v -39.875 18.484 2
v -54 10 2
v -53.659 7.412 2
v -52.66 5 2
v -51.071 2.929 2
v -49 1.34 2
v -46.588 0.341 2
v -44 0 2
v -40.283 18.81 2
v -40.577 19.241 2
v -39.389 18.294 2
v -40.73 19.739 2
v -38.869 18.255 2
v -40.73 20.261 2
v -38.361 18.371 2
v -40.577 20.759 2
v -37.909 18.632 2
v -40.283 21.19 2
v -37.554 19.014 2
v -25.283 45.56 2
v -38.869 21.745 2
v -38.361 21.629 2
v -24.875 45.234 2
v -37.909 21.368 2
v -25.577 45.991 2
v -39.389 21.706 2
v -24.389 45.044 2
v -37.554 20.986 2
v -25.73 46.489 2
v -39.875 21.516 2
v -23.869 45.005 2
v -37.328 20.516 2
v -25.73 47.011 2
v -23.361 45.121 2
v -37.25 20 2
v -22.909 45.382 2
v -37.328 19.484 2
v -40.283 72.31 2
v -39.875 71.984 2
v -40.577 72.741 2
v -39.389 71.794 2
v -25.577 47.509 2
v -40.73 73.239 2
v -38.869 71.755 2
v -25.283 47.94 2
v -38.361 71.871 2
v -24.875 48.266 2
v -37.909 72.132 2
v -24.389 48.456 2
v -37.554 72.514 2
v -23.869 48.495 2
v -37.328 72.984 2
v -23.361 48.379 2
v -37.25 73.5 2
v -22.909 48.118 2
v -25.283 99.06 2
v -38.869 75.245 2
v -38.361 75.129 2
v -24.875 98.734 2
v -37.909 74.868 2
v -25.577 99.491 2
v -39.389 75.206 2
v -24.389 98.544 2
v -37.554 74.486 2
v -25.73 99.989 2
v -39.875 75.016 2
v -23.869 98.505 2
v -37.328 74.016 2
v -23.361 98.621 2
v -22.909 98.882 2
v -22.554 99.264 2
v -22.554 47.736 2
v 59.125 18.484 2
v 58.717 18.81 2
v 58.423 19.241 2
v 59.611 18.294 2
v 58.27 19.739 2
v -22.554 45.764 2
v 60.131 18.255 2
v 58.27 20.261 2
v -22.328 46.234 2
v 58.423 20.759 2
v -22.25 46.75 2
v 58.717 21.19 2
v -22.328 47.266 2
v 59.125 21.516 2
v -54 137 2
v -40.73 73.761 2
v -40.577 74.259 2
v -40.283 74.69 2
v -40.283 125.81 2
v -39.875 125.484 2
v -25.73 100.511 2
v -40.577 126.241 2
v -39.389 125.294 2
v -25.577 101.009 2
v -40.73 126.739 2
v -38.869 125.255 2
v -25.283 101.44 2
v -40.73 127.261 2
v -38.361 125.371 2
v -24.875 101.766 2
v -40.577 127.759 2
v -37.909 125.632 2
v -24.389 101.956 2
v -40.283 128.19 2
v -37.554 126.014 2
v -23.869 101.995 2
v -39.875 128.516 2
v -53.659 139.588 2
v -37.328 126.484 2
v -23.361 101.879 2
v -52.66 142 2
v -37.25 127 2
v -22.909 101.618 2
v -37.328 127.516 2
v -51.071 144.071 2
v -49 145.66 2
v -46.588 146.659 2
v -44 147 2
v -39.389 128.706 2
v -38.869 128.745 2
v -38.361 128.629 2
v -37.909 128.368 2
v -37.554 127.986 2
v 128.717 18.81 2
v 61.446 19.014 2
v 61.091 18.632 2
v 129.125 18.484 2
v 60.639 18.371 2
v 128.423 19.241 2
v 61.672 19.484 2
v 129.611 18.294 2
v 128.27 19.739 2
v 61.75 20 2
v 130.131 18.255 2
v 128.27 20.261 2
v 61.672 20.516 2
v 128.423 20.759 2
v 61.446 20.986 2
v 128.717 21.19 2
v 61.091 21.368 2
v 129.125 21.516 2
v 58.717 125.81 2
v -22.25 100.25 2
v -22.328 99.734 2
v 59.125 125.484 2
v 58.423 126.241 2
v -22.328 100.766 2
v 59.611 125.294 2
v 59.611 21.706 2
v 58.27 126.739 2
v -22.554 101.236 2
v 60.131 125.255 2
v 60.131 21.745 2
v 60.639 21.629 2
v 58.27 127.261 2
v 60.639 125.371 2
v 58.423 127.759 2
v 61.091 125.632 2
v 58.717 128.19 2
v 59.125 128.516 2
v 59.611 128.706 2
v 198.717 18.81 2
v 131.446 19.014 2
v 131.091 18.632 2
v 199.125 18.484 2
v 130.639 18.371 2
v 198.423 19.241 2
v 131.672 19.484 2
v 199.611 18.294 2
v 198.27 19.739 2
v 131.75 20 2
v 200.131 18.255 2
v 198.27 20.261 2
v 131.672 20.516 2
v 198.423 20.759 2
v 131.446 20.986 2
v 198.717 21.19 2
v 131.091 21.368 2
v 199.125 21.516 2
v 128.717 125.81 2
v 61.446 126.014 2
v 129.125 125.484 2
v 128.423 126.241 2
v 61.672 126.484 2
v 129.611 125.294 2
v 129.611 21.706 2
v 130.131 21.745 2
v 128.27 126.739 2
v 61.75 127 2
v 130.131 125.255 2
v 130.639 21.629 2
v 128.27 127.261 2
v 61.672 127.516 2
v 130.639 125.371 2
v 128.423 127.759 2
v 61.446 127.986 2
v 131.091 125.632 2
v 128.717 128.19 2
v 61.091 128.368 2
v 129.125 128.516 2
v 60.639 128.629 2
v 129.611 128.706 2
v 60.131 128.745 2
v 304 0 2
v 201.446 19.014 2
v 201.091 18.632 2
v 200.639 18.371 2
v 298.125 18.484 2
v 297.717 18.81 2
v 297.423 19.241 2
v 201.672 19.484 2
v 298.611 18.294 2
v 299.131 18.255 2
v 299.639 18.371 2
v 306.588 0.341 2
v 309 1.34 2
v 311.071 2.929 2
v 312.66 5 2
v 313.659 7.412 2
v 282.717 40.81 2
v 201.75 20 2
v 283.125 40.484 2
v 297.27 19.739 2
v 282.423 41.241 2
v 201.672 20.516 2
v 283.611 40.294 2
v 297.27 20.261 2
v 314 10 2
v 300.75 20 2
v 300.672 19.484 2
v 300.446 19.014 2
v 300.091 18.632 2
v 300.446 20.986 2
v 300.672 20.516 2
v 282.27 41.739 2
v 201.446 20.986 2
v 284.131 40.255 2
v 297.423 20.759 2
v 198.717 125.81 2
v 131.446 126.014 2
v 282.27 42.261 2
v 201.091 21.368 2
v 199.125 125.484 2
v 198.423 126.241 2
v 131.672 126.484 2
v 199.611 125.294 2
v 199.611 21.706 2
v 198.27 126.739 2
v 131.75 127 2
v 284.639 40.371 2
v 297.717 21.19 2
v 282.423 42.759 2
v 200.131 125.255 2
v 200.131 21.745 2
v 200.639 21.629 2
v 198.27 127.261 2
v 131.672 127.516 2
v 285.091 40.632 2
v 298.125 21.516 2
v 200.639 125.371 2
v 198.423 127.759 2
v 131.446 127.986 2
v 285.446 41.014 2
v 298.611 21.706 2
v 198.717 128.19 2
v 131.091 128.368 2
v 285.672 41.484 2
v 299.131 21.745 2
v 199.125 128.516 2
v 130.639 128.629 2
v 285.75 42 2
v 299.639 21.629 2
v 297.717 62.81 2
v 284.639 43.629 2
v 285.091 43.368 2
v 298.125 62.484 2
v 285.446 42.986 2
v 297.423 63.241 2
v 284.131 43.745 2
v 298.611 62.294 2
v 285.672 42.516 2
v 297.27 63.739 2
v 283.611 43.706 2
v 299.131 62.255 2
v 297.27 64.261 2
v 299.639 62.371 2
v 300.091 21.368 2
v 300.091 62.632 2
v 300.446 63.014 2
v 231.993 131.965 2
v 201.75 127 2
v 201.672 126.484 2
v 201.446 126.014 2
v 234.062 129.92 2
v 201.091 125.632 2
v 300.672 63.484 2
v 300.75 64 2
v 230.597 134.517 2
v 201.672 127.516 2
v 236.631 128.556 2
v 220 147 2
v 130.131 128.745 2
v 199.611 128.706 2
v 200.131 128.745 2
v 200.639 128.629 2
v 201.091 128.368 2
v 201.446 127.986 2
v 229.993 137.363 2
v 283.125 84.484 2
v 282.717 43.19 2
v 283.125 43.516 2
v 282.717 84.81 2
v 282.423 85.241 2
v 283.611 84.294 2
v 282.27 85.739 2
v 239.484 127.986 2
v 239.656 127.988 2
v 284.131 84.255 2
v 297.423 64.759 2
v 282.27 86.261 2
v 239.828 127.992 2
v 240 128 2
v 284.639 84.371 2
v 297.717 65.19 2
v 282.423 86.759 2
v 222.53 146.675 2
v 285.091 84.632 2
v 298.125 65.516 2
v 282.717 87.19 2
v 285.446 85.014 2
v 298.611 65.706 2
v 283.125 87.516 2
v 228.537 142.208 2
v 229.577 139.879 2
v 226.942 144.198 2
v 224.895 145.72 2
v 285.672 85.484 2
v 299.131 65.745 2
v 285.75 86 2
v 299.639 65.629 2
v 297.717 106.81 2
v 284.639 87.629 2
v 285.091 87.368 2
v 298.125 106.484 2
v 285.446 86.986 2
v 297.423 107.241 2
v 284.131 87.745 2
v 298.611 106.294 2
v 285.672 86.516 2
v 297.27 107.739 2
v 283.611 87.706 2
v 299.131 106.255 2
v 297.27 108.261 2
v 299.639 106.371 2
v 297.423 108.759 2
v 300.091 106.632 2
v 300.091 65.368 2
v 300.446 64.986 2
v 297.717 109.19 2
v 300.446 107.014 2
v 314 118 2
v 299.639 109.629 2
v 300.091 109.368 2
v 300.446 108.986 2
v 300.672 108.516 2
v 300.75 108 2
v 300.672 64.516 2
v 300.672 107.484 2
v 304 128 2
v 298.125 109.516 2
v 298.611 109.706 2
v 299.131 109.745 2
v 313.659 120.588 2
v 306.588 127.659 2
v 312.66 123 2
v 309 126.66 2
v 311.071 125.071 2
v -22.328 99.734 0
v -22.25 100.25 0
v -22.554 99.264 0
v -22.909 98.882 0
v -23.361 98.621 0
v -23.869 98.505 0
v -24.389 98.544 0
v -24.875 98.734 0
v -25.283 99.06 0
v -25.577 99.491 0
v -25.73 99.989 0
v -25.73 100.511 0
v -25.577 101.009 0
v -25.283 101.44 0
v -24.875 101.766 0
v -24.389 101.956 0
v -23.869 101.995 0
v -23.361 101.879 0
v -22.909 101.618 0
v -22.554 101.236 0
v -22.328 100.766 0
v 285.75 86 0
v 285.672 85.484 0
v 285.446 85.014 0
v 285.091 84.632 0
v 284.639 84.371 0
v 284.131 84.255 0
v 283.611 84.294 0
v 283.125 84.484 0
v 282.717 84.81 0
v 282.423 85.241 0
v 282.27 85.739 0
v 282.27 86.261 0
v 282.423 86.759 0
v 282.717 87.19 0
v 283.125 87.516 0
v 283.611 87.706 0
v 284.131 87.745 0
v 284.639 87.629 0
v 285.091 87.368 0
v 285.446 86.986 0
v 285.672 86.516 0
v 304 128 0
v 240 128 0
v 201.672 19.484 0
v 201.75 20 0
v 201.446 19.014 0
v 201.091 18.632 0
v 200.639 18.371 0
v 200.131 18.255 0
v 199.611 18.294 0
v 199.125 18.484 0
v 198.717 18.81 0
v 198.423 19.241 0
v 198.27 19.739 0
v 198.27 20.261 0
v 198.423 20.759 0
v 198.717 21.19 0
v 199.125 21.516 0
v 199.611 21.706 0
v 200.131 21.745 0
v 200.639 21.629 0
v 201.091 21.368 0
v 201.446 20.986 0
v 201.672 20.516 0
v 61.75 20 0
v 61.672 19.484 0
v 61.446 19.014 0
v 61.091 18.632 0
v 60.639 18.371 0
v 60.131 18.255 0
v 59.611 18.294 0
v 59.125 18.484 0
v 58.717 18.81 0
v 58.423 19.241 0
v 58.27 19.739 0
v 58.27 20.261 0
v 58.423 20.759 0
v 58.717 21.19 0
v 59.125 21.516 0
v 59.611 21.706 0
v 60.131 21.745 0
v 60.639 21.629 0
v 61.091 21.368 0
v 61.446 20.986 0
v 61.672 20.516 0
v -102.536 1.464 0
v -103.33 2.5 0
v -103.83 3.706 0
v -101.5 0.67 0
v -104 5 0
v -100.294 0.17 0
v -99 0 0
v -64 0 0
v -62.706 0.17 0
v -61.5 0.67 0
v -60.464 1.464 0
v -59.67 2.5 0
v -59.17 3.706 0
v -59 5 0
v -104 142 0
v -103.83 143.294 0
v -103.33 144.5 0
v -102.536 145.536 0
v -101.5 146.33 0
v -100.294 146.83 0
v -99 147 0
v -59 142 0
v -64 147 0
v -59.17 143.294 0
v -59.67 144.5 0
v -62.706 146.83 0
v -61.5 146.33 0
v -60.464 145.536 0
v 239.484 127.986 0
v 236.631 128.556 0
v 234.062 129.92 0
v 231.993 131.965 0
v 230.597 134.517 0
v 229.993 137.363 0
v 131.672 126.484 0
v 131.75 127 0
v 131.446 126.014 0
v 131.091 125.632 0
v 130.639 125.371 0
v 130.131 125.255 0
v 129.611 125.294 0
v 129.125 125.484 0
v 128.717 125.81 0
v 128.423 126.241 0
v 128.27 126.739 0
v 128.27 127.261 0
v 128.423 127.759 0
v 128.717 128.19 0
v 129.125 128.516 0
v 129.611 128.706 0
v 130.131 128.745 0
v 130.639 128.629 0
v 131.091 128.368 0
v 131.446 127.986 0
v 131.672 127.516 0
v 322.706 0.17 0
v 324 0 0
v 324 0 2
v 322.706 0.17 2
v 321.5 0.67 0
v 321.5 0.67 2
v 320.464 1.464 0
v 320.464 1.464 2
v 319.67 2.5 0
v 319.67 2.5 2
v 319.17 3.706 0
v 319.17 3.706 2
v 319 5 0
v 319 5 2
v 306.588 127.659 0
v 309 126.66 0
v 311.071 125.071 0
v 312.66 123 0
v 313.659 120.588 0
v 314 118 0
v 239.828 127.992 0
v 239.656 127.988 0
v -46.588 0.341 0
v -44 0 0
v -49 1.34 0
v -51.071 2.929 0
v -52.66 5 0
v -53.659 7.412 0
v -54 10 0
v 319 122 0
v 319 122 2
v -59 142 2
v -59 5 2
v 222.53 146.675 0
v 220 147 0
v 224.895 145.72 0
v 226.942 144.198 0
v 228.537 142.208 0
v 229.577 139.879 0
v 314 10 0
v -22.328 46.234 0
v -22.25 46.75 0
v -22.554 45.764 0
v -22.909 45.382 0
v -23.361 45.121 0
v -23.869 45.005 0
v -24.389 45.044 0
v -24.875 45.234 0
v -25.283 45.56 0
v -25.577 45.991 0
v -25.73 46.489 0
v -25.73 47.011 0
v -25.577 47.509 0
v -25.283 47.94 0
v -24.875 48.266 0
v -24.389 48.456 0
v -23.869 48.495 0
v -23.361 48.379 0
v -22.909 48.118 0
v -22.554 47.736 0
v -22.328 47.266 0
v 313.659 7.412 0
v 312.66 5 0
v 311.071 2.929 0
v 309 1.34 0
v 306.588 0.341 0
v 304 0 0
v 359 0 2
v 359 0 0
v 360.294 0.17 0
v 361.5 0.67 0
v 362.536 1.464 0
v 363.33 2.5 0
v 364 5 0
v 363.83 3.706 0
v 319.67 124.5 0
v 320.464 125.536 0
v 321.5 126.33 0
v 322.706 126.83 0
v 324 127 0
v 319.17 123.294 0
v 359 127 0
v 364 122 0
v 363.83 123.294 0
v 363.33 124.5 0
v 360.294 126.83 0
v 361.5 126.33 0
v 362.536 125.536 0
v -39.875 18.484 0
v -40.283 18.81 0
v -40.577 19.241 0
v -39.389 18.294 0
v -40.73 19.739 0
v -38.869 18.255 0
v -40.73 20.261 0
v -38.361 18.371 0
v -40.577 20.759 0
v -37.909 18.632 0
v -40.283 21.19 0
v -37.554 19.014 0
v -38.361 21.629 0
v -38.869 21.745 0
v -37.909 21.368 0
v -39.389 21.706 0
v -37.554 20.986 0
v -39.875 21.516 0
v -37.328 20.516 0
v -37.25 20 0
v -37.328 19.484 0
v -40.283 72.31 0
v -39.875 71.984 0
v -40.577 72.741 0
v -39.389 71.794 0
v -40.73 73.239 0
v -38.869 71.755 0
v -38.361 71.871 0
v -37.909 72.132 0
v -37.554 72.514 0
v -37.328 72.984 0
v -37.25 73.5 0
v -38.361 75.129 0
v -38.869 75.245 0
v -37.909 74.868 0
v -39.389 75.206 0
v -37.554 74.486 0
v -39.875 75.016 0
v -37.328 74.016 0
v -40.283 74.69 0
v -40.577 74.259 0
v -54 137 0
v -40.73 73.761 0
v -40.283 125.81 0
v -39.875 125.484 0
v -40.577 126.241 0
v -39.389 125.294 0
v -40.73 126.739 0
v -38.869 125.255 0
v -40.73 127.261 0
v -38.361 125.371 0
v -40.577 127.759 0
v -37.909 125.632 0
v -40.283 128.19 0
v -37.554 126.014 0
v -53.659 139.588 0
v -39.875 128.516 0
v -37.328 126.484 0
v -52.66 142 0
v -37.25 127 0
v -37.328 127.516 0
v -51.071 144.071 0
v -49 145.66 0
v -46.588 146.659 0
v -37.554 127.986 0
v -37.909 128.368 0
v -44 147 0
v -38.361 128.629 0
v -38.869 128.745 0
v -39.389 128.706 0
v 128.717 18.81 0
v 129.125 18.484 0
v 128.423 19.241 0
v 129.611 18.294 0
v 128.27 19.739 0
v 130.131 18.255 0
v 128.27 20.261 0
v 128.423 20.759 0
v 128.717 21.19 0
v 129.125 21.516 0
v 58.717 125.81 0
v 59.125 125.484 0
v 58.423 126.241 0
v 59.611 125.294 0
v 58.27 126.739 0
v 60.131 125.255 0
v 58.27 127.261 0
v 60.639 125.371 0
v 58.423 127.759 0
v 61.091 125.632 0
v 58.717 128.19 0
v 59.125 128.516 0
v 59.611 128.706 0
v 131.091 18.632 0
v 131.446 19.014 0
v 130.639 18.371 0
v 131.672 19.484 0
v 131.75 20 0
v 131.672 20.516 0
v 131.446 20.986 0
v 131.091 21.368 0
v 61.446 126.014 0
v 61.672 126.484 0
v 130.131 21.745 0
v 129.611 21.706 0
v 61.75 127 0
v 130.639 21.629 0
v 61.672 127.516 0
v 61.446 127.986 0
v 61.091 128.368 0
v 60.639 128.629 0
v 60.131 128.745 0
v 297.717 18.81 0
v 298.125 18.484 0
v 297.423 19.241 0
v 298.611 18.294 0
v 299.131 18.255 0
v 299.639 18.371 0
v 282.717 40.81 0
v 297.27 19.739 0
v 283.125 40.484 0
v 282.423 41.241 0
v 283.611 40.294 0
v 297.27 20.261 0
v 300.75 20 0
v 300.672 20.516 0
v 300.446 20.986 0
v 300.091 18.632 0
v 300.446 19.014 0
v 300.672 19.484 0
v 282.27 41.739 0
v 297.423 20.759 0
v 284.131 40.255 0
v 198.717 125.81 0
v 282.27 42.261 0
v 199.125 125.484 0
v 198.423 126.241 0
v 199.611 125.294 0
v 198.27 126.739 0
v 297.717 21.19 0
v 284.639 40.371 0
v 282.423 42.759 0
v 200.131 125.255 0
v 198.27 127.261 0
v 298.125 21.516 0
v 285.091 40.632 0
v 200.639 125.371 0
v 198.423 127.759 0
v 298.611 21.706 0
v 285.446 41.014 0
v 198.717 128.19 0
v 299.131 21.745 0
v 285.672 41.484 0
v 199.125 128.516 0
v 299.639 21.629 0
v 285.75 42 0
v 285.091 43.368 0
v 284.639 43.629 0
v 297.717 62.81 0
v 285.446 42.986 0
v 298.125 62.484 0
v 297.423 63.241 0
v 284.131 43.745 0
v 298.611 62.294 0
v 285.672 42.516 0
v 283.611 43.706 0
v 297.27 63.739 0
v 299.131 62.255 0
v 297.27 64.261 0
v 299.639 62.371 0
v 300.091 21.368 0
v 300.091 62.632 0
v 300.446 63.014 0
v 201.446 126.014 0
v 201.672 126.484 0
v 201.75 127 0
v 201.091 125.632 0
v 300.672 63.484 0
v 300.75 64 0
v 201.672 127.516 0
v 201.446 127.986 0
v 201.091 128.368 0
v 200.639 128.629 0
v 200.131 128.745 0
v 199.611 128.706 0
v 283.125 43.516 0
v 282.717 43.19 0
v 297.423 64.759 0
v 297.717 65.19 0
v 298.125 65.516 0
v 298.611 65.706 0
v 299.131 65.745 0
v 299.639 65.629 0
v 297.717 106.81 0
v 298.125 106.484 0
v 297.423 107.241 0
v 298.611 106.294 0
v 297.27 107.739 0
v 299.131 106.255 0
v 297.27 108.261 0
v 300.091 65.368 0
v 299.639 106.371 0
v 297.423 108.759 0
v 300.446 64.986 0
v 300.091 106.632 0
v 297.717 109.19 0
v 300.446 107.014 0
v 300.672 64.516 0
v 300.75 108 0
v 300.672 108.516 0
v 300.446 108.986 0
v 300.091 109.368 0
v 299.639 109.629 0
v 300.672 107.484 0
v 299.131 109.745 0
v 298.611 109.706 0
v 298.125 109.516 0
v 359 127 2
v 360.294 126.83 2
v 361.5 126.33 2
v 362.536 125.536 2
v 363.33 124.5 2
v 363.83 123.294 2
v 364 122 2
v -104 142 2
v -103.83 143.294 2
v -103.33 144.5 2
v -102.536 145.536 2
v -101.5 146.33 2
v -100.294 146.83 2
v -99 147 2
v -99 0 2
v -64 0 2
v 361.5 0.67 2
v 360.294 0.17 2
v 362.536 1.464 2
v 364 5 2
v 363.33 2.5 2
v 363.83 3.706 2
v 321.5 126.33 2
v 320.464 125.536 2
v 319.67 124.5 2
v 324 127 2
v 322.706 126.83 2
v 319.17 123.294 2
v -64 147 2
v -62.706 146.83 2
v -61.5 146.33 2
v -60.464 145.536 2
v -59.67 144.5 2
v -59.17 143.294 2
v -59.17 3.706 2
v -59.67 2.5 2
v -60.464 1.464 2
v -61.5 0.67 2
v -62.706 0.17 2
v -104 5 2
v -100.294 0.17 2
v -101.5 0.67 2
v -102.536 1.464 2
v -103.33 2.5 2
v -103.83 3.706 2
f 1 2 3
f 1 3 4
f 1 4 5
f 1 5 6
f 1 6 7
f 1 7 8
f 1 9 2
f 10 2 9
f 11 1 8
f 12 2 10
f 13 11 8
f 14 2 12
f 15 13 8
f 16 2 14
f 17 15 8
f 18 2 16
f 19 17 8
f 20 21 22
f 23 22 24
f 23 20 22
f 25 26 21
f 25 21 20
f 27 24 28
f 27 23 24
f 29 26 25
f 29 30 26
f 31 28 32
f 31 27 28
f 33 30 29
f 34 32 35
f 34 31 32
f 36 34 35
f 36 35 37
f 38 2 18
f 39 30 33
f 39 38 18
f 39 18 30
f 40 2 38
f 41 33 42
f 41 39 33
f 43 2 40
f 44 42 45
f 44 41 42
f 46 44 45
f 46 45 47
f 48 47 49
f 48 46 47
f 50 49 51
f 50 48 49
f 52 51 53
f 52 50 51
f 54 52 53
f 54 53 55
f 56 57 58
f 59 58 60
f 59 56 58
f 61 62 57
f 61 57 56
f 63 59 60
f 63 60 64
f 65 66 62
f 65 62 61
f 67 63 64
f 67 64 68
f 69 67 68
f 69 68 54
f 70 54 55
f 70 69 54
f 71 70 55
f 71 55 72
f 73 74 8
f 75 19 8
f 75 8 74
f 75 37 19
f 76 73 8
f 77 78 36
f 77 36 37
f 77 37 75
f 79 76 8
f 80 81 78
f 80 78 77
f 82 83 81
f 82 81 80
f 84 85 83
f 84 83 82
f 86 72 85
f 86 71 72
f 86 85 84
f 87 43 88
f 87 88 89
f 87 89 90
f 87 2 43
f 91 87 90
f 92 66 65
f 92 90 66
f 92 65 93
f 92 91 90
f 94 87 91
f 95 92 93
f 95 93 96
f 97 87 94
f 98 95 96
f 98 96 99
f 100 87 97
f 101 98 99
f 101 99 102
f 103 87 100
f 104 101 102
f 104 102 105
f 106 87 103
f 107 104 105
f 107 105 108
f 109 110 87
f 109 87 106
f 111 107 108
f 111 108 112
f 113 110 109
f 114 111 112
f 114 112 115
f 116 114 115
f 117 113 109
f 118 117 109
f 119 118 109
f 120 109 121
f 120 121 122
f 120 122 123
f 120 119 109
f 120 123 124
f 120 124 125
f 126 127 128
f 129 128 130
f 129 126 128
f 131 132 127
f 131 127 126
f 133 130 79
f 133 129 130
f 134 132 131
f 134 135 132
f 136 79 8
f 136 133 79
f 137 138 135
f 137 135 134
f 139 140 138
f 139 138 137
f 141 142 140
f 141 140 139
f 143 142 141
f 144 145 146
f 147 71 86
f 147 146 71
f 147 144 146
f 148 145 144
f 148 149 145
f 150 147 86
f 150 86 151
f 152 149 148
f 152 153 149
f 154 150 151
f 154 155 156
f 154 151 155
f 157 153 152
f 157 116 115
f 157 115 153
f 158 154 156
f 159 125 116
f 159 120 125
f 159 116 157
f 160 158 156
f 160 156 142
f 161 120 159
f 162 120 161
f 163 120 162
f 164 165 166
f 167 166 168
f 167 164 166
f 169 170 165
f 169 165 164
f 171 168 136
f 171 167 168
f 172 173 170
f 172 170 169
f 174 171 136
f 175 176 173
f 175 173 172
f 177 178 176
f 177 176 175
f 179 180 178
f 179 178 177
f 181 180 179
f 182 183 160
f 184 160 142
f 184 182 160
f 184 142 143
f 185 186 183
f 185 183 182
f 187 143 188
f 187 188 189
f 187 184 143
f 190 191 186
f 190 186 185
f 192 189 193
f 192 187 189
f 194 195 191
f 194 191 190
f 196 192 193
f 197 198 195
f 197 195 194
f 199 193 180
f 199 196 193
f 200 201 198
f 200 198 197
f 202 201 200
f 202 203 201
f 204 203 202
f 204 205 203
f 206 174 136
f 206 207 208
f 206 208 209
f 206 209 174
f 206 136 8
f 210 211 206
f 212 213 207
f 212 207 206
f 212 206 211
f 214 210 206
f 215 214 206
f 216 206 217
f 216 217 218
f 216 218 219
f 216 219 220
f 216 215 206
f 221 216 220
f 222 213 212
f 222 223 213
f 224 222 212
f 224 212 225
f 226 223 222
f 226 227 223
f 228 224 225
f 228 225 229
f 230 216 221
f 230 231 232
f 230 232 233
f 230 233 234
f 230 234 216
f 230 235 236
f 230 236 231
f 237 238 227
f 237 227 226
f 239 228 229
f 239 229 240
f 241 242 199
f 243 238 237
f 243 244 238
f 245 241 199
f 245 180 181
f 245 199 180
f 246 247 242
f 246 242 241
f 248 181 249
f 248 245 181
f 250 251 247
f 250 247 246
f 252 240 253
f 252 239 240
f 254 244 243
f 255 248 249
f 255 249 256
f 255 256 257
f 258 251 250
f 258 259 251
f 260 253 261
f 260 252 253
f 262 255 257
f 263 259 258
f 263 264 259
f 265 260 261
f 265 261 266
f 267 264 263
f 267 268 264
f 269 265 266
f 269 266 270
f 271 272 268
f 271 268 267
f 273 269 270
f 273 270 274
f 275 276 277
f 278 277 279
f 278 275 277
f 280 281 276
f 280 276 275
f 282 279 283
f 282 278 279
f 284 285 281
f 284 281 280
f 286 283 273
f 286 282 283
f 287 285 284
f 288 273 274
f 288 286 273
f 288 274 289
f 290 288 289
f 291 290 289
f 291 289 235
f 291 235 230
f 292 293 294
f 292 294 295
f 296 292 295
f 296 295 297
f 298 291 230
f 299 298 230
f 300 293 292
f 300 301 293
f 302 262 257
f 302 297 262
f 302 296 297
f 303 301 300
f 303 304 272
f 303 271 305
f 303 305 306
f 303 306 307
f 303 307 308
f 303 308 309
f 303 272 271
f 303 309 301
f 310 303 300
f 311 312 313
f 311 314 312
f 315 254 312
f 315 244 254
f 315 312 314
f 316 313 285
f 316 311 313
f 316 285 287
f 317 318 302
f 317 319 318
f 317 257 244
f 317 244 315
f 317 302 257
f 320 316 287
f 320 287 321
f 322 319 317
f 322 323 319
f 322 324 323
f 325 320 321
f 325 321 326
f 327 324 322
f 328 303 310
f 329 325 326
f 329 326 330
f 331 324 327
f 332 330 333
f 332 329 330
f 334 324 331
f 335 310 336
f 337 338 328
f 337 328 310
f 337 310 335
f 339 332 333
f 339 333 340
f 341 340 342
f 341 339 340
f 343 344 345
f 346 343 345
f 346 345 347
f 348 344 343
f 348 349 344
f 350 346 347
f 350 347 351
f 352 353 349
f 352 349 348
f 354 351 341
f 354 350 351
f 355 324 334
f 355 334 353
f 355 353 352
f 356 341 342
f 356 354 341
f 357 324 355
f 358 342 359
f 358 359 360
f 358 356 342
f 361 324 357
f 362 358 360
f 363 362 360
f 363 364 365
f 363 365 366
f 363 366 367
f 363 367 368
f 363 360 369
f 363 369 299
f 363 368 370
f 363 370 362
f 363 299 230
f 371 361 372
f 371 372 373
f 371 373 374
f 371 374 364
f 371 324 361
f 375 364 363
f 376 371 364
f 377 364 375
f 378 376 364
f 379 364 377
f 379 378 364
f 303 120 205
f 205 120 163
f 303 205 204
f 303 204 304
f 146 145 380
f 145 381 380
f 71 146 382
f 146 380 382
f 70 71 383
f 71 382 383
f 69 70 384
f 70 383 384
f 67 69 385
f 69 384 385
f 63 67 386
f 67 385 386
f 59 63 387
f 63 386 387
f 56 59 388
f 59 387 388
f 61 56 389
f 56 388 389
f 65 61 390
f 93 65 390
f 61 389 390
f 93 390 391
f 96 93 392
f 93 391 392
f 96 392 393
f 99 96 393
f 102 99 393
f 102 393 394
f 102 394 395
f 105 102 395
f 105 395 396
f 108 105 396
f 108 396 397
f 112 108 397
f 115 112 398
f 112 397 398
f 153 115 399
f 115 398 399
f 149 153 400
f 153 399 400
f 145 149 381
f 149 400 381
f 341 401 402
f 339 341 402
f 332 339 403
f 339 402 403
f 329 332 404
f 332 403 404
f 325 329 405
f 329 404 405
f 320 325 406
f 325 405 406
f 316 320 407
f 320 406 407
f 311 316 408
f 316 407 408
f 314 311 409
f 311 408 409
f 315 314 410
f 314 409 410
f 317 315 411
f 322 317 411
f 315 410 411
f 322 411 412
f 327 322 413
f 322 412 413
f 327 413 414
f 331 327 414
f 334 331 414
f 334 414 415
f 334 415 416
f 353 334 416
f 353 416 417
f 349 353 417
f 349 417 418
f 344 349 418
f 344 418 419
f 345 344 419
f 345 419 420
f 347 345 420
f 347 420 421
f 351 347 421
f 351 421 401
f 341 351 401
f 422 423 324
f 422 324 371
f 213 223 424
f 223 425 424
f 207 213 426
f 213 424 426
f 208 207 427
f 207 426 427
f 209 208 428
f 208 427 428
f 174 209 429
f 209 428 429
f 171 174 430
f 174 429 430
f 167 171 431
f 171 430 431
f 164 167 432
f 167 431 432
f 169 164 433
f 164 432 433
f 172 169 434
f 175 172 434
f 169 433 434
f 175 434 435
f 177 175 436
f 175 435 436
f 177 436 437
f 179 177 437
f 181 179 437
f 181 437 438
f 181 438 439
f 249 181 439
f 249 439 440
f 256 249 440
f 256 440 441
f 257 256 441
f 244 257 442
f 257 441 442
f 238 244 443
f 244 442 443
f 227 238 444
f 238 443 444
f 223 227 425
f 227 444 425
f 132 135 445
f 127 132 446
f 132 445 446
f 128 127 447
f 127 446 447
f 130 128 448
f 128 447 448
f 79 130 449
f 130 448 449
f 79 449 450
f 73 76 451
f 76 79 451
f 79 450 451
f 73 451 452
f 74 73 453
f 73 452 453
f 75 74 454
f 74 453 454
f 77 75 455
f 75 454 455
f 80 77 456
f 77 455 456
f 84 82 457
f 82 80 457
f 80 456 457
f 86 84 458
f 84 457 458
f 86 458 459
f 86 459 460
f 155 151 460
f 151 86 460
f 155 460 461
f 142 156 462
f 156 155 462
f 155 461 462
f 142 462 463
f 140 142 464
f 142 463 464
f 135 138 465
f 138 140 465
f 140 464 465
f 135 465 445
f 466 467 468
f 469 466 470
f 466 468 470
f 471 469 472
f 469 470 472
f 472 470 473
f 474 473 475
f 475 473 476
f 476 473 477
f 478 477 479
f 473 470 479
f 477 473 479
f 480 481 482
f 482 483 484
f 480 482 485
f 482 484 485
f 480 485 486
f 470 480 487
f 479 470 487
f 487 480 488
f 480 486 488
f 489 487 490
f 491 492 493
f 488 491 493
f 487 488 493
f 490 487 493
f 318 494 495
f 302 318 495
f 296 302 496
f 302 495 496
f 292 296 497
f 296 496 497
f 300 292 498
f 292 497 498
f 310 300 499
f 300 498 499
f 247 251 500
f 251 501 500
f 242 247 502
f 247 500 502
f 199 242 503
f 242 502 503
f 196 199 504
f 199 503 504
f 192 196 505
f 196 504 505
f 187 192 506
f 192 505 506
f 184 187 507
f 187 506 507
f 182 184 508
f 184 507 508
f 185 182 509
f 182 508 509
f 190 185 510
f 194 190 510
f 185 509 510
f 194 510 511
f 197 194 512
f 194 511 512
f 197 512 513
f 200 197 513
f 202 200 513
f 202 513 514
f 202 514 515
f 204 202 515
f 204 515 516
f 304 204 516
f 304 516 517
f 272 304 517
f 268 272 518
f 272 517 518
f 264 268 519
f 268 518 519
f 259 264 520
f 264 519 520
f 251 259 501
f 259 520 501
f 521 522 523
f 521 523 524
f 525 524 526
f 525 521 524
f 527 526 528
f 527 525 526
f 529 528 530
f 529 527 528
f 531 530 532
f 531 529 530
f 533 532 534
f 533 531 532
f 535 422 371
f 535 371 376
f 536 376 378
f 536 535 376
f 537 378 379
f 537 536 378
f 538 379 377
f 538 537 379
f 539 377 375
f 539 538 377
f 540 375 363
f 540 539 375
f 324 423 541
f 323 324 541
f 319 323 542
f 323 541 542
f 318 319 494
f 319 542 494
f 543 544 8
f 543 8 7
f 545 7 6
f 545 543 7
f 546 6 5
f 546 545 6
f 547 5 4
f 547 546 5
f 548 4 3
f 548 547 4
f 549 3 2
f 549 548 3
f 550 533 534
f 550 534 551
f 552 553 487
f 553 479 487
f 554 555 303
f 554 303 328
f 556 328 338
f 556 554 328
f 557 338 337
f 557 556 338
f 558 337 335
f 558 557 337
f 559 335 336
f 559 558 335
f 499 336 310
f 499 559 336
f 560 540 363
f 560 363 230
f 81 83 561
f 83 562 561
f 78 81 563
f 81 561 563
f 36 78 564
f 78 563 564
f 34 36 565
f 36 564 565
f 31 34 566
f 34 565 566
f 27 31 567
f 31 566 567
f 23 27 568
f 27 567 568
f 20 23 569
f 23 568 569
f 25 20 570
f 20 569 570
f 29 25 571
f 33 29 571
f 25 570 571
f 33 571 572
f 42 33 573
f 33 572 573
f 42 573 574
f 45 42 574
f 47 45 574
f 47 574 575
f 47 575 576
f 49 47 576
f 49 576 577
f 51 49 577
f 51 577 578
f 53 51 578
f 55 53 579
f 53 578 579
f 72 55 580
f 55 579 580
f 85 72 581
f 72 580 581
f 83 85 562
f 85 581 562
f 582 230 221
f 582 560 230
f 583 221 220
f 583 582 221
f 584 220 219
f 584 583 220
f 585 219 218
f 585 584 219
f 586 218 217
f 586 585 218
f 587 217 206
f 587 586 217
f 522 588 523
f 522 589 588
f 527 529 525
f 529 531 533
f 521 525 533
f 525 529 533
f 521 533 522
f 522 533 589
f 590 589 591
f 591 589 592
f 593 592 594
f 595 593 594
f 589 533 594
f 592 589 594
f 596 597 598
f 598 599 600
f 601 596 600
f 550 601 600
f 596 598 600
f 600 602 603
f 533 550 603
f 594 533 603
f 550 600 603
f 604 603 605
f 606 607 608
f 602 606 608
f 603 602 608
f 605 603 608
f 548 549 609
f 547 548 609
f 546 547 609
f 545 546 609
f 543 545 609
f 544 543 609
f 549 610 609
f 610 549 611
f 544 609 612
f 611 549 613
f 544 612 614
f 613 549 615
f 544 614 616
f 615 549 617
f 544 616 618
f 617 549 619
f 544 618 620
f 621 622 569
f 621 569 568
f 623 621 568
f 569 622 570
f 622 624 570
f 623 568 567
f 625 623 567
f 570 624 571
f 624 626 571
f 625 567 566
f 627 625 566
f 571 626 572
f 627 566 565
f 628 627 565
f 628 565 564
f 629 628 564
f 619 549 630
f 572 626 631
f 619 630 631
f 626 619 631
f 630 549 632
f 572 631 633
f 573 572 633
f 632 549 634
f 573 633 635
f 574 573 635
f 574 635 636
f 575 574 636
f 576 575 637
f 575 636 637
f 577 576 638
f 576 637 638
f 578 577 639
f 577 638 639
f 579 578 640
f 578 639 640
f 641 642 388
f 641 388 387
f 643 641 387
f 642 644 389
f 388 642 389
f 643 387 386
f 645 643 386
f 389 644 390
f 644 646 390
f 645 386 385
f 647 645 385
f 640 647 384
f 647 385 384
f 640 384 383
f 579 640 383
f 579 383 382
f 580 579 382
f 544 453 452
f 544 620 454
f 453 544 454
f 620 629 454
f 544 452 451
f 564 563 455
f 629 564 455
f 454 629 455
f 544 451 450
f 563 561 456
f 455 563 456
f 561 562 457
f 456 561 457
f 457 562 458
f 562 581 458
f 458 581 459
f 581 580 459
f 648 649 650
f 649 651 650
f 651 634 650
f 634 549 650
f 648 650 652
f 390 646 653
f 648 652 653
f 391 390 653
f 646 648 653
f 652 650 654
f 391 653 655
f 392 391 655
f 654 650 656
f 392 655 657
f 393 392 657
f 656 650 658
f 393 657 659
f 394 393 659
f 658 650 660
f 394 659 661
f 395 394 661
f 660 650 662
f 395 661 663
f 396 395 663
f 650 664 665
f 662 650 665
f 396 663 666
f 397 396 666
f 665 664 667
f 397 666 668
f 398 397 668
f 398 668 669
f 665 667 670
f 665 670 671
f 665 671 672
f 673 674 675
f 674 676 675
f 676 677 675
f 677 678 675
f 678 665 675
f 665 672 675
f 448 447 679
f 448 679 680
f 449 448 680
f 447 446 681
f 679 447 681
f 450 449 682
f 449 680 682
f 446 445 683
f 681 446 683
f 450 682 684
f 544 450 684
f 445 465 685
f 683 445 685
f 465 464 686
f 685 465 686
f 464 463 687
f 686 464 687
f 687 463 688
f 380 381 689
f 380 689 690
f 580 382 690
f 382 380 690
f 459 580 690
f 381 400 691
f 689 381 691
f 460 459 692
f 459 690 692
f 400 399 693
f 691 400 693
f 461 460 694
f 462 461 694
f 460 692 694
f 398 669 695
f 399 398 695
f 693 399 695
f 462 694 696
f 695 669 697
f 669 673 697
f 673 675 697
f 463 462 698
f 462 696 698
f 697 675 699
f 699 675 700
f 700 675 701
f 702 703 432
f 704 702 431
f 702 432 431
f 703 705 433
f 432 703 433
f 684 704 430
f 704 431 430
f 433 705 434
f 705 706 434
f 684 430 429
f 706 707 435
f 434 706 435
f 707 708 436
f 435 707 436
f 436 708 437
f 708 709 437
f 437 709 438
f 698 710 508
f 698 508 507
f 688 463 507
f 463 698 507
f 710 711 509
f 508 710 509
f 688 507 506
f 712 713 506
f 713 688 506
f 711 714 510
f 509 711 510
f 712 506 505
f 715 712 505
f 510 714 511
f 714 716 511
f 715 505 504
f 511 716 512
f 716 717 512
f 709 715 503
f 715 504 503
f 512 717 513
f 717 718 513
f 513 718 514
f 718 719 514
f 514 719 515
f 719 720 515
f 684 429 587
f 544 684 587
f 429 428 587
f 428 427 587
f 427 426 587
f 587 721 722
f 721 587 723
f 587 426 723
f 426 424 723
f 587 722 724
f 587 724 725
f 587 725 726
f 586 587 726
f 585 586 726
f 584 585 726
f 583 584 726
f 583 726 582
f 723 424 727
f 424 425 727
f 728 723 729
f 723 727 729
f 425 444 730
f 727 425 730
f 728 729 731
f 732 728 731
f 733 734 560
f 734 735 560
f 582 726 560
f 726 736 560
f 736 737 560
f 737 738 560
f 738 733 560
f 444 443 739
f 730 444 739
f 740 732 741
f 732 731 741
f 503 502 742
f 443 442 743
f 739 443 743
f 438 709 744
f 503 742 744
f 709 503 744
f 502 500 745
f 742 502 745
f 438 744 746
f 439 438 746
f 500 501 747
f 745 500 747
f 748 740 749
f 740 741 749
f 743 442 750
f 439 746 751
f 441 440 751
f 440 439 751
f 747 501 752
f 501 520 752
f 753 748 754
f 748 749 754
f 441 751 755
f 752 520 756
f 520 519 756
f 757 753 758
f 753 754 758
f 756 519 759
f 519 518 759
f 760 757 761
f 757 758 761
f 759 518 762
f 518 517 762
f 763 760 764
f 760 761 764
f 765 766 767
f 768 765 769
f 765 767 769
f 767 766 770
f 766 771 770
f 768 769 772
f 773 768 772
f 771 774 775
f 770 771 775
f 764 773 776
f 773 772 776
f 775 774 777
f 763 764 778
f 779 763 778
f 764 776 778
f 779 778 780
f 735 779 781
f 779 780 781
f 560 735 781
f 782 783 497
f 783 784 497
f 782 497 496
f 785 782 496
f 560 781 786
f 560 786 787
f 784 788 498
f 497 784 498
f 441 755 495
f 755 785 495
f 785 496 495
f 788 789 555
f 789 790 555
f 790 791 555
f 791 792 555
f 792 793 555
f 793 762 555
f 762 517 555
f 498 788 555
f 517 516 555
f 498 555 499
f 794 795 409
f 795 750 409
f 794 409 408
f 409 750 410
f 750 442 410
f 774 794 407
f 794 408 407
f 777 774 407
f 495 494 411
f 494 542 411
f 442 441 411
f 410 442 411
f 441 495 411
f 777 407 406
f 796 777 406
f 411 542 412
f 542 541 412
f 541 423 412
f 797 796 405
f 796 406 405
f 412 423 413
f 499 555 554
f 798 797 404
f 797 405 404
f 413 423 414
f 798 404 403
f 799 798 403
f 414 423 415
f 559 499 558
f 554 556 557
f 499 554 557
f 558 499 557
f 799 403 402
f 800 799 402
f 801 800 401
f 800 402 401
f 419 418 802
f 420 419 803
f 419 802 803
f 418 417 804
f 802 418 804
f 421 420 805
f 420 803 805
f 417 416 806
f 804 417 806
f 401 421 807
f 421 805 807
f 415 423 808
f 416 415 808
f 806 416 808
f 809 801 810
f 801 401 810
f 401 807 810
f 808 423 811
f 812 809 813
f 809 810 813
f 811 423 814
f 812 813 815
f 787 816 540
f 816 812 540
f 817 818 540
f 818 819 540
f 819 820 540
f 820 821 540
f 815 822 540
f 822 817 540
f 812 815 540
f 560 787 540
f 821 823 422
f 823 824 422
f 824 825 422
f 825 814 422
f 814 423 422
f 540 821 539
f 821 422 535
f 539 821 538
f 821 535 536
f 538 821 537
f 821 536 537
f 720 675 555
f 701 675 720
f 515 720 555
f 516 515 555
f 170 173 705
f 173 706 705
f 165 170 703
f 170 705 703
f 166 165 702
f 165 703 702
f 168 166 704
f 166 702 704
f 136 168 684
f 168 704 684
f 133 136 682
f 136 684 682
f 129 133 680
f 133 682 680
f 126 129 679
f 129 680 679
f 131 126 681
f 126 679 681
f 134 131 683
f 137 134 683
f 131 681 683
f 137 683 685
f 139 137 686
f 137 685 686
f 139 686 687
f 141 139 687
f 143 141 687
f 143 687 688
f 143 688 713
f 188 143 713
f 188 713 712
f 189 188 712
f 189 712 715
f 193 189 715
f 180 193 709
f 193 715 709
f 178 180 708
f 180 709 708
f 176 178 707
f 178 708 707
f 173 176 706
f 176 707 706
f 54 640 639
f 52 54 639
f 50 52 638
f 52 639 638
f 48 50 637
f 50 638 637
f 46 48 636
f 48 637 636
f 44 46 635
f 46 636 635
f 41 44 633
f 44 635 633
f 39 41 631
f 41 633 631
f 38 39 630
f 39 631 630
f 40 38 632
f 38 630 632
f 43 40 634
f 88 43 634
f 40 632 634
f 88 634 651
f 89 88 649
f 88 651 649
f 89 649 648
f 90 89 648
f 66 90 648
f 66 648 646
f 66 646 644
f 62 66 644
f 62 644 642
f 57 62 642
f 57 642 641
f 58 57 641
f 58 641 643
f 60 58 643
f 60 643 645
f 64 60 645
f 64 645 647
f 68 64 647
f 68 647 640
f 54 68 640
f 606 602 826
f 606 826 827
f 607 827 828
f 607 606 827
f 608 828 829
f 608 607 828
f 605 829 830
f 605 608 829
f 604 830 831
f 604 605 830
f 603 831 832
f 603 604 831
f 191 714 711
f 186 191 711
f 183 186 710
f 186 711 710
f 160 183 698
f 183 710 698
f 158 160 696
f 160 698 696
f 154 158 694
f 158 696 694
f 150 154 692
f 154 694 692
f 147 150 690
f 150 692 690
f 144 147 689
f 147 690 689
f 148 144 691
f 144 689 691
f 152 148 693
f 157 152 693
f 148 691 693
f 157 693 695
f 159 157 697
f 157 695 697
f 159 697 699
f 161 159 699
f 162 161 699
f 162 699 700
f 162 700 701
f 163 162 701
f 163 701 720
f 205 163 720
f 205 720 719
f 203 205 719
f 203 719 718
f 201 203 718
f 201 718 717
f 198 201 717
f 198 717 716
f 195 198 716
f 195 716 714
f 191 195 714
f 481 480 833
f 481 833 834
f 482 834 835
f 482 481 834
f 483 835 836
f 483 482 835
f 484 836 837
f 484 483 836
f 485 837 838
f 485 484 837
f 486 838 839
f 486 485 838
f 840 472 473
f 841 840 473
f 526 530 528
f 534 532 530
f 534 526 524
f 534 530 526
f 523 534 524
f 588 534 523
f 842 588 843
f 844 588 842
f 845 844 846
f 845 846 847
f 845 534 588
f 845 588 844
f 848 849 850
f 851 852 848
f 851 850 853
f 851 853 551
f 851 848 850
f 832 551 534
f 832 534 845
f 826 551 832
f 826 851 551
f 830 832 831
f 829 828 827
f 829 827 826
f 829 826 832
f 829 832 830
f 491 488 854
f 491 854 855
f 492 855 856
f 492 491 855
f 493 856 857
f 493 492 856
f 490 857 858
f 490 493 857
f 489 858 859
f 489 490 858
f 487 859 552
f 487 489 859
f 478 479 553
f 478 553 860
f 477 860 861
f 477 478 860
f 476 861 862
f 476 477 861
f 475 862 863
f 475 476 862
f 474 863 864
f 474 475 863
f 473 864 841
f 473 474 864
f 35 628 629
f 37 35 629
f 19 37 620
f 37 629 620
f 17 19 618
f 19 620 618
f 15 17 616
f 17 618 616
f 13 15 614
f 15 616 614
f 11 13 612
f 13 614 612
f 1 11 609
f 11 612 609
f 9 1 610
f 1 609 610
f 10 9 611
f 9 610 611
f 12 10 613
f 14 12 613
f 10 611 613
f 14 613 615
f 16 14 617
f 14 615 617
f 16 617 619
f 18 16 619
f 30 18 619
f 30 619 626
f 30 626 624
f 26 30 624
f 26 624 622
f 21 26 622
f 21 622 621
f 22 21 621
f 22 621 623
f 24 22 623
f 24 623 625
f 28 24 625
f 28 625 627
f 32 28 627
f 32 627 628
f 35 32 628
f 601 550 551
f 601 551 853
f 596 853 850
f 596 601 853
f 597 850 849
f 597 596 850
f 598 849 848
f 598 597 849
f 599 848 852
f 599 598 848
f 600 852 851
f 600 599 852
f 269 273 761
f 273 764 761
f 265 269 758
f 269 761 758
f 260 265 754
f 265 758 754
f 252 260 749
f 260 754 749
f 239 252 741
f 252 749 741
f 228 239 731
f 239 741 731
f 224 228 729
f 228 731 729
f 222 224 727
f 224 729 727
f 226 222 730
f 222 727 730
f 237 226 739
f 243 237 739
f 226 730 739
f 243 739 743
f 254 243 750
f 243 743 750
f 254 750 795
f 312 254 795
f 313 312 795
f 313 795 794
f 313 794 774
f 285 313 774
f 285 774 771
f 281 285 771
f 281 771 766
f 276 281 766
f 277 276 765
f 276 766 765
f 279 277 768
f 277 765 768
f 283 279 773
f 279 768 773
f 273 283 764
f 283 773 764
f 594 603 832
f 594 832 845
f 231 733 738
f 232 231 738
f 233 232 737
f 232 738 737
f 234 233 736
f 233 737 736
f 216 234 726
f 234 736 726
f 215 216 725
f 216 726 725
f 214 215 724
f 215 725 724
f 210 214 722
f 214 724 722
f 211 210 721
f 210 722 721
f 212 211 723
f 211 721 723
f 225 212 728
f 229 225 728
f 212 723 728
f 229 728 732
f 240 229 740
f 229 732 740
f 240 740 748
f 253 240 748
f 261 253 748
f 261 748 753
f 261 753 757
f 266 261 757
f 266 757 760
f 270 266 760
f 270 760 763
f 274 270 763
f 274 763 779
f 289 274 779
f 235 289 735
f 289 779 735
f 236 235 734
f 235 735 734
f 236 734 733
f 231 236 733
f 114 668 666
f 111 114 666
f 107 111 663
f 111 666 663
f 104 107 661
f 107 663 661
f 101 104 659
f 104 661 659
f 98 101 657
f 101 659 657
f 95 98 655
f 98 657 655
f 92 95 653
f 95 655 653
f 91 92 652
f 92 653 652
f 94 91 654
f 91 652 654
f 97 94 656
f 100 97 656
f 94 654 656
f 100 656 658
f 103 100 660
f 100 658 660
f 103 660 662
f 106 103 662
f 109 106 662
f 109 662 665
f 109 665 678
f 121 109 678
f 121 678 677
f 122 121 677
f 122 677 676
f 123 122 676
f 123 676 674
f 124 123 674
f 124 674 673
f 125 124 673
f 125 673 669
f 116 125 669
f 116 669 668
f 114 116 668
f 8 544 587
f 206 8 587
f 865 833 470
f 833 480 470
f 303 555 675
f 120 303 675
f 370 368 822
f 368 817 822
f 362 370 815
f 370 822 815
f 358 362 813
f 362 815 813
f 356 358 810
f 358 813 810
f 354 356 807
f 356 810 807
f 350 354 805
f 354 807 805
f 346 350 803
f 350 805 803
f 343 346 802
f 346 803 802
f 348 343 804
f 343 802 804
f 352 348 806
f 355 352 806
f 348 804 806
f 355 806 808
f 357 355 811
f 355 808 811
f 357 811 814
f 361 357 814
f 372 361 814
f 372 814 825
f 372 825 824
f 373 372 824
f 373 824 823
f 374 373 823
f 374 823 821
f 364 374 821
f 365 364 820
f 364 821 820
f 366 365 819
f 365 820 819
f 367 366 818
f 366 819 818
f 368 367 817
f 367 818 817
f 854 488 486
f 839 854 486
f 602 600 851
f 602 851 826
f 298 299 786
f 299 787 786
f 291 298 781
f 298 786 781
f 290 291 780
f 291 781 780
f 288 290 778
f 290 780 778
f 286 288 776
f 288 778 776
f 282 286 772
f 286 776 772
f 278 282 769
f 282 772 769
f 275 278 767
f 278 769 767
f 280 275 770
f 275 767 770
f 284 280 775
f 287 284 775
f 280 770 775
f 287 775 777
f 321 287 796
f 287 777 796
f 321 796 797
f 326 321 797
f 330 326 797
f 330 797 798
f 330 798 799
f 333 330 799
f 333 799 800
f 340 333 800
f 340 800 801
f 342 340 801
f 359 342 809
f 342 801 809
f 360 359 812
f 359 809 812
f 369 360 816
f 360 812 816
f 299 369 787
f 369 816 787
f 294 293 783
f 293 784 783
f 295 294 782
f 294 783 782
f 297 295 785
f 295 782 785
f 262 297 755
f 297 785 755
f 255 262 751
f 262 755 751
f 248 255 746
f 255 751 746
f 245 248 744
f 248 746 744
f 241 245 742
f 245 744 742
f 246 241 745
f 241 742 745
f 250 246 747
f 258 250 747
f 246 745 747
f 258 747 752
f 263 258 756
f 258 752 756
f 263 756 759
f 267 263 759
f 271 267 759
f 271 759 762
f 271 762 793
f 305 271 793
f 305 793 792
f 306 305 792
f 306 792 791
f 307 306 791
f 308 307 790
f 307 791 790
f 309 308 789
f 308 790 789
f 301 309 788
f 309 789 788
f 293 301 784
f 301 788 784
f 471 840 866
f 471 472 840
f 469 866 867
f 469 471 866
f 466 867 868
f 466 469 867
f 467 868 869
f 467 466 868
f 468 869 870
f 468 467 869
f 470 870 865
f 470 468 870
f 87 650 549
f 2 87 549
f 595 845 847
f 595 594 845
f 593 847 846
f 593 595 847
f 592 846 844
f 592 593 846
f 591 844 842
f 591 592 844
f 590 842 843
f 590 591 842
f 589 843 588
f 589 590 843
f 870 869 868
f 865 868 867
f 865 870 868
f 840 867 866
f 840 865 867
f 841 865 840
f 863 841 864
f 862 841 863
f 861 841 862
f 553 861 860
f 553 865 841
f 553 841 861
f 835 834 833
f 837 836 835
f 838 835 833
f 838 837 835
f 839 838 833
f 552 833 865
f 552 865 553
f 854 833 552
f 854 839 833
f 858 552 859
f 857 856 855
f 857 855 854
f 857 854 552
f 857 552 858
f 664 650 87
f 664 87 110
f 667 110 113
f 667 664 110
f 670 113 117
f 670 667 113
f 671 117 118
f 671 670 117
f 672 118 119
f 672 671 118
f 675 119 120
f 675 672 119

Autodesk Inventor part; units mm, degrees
ref_plane "YZ Plane" through (0, 0, 0) normal (1, 0, 0) x (0, 1, 0)
ref_plane "XZ Plane" through (0, 0, 0) normal (0, 1, 0) x (-1, 0, 0)
ref_plane "XY Plane" through (0, 0, 0) normal (0, 0, 1) x (1, 0, 0)
sketch "Sketch1" plane through (0, 0, 0) normal (0, 0, 1) x (1, 0, 0)
  line L0 (0, 0) -> (260, 0)
  line L1 (260, 0) -> (260, 128)
  line L2 (220, 147) -> (0, 147)
  line L3 (0, 147) -> (0, 0)
  circle A0 centre (240, 138) radius 8
  arc A1 (229.9934, 137.3628) -> (220, 147) centre (220, 137) ccw
  line L4 (260, 147) -> (260, 147)
  line L5 (240, 128) -> (260, 128)
  line L6 (0, 73.5) -> (260, 73.5)
  line L7 (60, 127) -> (200, 127)
  line L8 (200, 127) -> (200, 20)
  line L9 (200, 20) -> (60, 20)
  line L10 (60, 20) -> (60, 127)
  circle A2 centre (60, 127) radius 1.75
  circle A3 centre (200, 127) radius 1.75
  circle A4 centre (200, 20) radius 1.75
  circle A5 centre (60, 20) radius 1.75
  circle A6 centre (130, 127) radius 1.75
  circle A7 centre (130, 20) radius 1.75
  line L11 (260, 128) -> (264, 128)
  line L12 (264, 128) -> (264, 0)
  line L13 (264, 0) -> (260, 0)
  line L14 (260, 0) -> (260, 128)
  line L15 (0, 147) -> (-4, 147)
  line L16 (-4, 147) -> (-4, 0)
  line L17 (-4, 0) -> (0, 0)
  line L18 (0, 0) -> (0, 147)
  line L19 (-4, 147) -> (-44, 147)
  line L20 (-54, 137) -> (-54, 10)
  line L21 (-44, 0) -> (-4, 0)
  line L22 (-4, 0) -> (-4, 147)
  line L23 (264, 128) -> (304, 128)
  line L24 (314, 118) -> (314, 10)
  line L25 (304, 0) -> (264, 0)
  line L26 (264, 0) -> (264, 128)
  arc A8 (-44, 147) -> (-54, 137) centre (-44, 137) ccw
  arc A9 (-54, 10) -> (-44, 0) centre (-44, 10) ccw
  arc A10 (304, 0) -> (314, 10) centre (304, 10) ccw
  arc A11 (314, 118) -> (304, 128) centre (304, 118) ccw
  arc A12 (239.4838, 127.9864) -> (240, 128) centre (239.4816, 137.9024) ccw
  line L27 (299, 128) -> (299, 0)
  line L28 (284, 128) -> (284, 0)
  line L29 (-39, 147) -> (-39, 0)
  line L30 (-24, 147) -> (-24, 0)
  arc A13 (229.9934, 137.3628) -> (239.4838, 127.9864) centre (240, 138) ccw
  circle A14 centre (-39, 73.5) radius 1.75
  circle A15 centre (-39, 20) radius 1.75
  circle A16 centre (-39, 127) radius 1.75
  circle A17 centre (299, 108) radius 1.75
  circle A18 centre (299, 20) radius 1.75
  circle A19 centre (299, 64) radius 1.75
  circle A20 centre (284, 86) radius 1.75
  circle A21 centre (284, 42) radius 1.75
  circle A22 centre (-24, 100.25) radius 1.75
  circle A23 centre (-24, 46.75) radius 1.75
  line L31 (-64, 147) -> (-99, 147)
  line L32 (-104, 142) -> (-104, 5)
  line L33 (-99, 0) -> (-64, 0)
  line L34 (-59, 5) -> (-59, 142)
  line L35 (324, 127) -> (359, 127)
  line L36 (364, 122) -> (364, 5)
  line L37 (359, 0) -> (324, 0)
  line L38 (319, 5) -> (319, 122)
  arc A24 (364, 122) -> (359, 127) centre (359, 122) ccw
  arc A25 (324, 127) -> (319, 122) centre (324, 122) ccw
  arc A26 (319, 5) -> (324, 0) centre (324, 5) ccw
  arc A27 (359, 0) -> (364, 5) centre (359, 5) ccw
  arc A28 (-64, 0) -> (-59, 5) centre (-64, 5) ccw
  arc A29 (-104, 5) -> (-99, 0) centre (-99, 5) ccw
  arc A30 (-99, 147) -> (-104, 142) centre (-99, 142) ccw
  arc A31 (-59, 142) -> (-64, 147) centre (-64, 142) ccw
  point P0 (230, 135)
  point P1 (260, 67.5)
  point P2 (-54, 0)
  point P3 (314, 0)
  point P4 (-4, 0)
  point P5 (264, 0)
  point P6 (-4, 0)
  point P7 (264, 0)
  point P8 (-104, 0)
  point P9 (-59, 0)
  point P10 (364, 0)
  point P11 (319, 0)
  dimension "d2" = 16
  dimension "d3" = 20
  dimension "d4" = 138
  dimension "d6" = 260
  dimension "d7" = 147
  dimension "d8" = 10
  dimension "d11" = 19
  dimension "d16" = 20
  dimension "d17" = 20
  dimension "d18" = 60
  dimension "d19" = 60
  dimension "d20" = 3.5
  dimension "d21" = 3.5
  dimension "d22" = 3.5
  dimension "d23" = 3.5
  dimension "d24" = 140
  dimension "d25" = 107
  dimension "d26" = 3.5
  dimension "d27" = 3.5
  dimension "d29" = 70
  dimension "d30" = 4
  dimension "d31" = 4
  dimension "d32" = 50
  dimension "d33" = 50
  dimension "d34" = 10
  dimension "d35" = 368
  dimension "d37" = 15
  dimension "d38" = 15
  dimension "d39" = 15
  dimension "d40" = 15
  dimension "d41" = 3.5
  dimension "d42" = 73.5
  dimension "d43" = 3.5
  dimension "d44" = 3.5
  dimension "d45" = 3.5
  dimension "d46" = 3.5
  dimension "d47" = 20
  dimension "d48" = 20
  dimension "d49" = 3.5
  dimension "d50" = 3.5
  dimension "d51" = 3.5
  dimension "d52" = 3.5
  dimension "d53" = 53.5
  dimension "d54" = 26.75
  dimension "d55" = 26.75
  dimension "d58" = 20
  dimension "d59" = 45
  dimension "d60" = 45
  dimension "d62" = 5
  dimension "d63" = 5
  dimension "d66" = 5
  dimension "d67" = 5
  dimension "d68" = 3.5
  dimension "d69" = 128
  dimension "d70" = 64
  dimension "d71" = 44
  dimension "d72" = 22
  dimension "d73" = 22
extrude "Extrusion1" add sketch "Sketch1" along normal blind 2 contours L3 L6 L10 A5 L9 A7 A4 L8 L1 L0 | L17 L16 L15 L3 | L1 L11 L12 L13 | L3 L2 A1 A13 A12 L5 L1 L6 L8 A3 L7 A6 A2 L10 | L21 L30 A23 A22 L19 L16 | L12 L23 L28 A20 A21 L25 | L10 A2 L7 A6 A3 L8 L6 | L6 L8 A4 L9 A7 A5 L10 | L21 L29 A15 A14 A16 L19 L30 A22 A23 | L28 A21 A20 L23 L27 A17 A19 A18 L25 | L21 A9 L20 A8 L19 L29 A16 A14 A15 | L27 A18 A19 A17 L23 A11 L24 A10 L25
extrude "Extrusion2" add sketch "Sketch1" along normal blind 2 contours A31 L34 A28 L33 A29 L32 A30 L31 | L35 A24 L36 A27 L37 A26 L38 A25
properties part number "Coffee_Machine_Base"
